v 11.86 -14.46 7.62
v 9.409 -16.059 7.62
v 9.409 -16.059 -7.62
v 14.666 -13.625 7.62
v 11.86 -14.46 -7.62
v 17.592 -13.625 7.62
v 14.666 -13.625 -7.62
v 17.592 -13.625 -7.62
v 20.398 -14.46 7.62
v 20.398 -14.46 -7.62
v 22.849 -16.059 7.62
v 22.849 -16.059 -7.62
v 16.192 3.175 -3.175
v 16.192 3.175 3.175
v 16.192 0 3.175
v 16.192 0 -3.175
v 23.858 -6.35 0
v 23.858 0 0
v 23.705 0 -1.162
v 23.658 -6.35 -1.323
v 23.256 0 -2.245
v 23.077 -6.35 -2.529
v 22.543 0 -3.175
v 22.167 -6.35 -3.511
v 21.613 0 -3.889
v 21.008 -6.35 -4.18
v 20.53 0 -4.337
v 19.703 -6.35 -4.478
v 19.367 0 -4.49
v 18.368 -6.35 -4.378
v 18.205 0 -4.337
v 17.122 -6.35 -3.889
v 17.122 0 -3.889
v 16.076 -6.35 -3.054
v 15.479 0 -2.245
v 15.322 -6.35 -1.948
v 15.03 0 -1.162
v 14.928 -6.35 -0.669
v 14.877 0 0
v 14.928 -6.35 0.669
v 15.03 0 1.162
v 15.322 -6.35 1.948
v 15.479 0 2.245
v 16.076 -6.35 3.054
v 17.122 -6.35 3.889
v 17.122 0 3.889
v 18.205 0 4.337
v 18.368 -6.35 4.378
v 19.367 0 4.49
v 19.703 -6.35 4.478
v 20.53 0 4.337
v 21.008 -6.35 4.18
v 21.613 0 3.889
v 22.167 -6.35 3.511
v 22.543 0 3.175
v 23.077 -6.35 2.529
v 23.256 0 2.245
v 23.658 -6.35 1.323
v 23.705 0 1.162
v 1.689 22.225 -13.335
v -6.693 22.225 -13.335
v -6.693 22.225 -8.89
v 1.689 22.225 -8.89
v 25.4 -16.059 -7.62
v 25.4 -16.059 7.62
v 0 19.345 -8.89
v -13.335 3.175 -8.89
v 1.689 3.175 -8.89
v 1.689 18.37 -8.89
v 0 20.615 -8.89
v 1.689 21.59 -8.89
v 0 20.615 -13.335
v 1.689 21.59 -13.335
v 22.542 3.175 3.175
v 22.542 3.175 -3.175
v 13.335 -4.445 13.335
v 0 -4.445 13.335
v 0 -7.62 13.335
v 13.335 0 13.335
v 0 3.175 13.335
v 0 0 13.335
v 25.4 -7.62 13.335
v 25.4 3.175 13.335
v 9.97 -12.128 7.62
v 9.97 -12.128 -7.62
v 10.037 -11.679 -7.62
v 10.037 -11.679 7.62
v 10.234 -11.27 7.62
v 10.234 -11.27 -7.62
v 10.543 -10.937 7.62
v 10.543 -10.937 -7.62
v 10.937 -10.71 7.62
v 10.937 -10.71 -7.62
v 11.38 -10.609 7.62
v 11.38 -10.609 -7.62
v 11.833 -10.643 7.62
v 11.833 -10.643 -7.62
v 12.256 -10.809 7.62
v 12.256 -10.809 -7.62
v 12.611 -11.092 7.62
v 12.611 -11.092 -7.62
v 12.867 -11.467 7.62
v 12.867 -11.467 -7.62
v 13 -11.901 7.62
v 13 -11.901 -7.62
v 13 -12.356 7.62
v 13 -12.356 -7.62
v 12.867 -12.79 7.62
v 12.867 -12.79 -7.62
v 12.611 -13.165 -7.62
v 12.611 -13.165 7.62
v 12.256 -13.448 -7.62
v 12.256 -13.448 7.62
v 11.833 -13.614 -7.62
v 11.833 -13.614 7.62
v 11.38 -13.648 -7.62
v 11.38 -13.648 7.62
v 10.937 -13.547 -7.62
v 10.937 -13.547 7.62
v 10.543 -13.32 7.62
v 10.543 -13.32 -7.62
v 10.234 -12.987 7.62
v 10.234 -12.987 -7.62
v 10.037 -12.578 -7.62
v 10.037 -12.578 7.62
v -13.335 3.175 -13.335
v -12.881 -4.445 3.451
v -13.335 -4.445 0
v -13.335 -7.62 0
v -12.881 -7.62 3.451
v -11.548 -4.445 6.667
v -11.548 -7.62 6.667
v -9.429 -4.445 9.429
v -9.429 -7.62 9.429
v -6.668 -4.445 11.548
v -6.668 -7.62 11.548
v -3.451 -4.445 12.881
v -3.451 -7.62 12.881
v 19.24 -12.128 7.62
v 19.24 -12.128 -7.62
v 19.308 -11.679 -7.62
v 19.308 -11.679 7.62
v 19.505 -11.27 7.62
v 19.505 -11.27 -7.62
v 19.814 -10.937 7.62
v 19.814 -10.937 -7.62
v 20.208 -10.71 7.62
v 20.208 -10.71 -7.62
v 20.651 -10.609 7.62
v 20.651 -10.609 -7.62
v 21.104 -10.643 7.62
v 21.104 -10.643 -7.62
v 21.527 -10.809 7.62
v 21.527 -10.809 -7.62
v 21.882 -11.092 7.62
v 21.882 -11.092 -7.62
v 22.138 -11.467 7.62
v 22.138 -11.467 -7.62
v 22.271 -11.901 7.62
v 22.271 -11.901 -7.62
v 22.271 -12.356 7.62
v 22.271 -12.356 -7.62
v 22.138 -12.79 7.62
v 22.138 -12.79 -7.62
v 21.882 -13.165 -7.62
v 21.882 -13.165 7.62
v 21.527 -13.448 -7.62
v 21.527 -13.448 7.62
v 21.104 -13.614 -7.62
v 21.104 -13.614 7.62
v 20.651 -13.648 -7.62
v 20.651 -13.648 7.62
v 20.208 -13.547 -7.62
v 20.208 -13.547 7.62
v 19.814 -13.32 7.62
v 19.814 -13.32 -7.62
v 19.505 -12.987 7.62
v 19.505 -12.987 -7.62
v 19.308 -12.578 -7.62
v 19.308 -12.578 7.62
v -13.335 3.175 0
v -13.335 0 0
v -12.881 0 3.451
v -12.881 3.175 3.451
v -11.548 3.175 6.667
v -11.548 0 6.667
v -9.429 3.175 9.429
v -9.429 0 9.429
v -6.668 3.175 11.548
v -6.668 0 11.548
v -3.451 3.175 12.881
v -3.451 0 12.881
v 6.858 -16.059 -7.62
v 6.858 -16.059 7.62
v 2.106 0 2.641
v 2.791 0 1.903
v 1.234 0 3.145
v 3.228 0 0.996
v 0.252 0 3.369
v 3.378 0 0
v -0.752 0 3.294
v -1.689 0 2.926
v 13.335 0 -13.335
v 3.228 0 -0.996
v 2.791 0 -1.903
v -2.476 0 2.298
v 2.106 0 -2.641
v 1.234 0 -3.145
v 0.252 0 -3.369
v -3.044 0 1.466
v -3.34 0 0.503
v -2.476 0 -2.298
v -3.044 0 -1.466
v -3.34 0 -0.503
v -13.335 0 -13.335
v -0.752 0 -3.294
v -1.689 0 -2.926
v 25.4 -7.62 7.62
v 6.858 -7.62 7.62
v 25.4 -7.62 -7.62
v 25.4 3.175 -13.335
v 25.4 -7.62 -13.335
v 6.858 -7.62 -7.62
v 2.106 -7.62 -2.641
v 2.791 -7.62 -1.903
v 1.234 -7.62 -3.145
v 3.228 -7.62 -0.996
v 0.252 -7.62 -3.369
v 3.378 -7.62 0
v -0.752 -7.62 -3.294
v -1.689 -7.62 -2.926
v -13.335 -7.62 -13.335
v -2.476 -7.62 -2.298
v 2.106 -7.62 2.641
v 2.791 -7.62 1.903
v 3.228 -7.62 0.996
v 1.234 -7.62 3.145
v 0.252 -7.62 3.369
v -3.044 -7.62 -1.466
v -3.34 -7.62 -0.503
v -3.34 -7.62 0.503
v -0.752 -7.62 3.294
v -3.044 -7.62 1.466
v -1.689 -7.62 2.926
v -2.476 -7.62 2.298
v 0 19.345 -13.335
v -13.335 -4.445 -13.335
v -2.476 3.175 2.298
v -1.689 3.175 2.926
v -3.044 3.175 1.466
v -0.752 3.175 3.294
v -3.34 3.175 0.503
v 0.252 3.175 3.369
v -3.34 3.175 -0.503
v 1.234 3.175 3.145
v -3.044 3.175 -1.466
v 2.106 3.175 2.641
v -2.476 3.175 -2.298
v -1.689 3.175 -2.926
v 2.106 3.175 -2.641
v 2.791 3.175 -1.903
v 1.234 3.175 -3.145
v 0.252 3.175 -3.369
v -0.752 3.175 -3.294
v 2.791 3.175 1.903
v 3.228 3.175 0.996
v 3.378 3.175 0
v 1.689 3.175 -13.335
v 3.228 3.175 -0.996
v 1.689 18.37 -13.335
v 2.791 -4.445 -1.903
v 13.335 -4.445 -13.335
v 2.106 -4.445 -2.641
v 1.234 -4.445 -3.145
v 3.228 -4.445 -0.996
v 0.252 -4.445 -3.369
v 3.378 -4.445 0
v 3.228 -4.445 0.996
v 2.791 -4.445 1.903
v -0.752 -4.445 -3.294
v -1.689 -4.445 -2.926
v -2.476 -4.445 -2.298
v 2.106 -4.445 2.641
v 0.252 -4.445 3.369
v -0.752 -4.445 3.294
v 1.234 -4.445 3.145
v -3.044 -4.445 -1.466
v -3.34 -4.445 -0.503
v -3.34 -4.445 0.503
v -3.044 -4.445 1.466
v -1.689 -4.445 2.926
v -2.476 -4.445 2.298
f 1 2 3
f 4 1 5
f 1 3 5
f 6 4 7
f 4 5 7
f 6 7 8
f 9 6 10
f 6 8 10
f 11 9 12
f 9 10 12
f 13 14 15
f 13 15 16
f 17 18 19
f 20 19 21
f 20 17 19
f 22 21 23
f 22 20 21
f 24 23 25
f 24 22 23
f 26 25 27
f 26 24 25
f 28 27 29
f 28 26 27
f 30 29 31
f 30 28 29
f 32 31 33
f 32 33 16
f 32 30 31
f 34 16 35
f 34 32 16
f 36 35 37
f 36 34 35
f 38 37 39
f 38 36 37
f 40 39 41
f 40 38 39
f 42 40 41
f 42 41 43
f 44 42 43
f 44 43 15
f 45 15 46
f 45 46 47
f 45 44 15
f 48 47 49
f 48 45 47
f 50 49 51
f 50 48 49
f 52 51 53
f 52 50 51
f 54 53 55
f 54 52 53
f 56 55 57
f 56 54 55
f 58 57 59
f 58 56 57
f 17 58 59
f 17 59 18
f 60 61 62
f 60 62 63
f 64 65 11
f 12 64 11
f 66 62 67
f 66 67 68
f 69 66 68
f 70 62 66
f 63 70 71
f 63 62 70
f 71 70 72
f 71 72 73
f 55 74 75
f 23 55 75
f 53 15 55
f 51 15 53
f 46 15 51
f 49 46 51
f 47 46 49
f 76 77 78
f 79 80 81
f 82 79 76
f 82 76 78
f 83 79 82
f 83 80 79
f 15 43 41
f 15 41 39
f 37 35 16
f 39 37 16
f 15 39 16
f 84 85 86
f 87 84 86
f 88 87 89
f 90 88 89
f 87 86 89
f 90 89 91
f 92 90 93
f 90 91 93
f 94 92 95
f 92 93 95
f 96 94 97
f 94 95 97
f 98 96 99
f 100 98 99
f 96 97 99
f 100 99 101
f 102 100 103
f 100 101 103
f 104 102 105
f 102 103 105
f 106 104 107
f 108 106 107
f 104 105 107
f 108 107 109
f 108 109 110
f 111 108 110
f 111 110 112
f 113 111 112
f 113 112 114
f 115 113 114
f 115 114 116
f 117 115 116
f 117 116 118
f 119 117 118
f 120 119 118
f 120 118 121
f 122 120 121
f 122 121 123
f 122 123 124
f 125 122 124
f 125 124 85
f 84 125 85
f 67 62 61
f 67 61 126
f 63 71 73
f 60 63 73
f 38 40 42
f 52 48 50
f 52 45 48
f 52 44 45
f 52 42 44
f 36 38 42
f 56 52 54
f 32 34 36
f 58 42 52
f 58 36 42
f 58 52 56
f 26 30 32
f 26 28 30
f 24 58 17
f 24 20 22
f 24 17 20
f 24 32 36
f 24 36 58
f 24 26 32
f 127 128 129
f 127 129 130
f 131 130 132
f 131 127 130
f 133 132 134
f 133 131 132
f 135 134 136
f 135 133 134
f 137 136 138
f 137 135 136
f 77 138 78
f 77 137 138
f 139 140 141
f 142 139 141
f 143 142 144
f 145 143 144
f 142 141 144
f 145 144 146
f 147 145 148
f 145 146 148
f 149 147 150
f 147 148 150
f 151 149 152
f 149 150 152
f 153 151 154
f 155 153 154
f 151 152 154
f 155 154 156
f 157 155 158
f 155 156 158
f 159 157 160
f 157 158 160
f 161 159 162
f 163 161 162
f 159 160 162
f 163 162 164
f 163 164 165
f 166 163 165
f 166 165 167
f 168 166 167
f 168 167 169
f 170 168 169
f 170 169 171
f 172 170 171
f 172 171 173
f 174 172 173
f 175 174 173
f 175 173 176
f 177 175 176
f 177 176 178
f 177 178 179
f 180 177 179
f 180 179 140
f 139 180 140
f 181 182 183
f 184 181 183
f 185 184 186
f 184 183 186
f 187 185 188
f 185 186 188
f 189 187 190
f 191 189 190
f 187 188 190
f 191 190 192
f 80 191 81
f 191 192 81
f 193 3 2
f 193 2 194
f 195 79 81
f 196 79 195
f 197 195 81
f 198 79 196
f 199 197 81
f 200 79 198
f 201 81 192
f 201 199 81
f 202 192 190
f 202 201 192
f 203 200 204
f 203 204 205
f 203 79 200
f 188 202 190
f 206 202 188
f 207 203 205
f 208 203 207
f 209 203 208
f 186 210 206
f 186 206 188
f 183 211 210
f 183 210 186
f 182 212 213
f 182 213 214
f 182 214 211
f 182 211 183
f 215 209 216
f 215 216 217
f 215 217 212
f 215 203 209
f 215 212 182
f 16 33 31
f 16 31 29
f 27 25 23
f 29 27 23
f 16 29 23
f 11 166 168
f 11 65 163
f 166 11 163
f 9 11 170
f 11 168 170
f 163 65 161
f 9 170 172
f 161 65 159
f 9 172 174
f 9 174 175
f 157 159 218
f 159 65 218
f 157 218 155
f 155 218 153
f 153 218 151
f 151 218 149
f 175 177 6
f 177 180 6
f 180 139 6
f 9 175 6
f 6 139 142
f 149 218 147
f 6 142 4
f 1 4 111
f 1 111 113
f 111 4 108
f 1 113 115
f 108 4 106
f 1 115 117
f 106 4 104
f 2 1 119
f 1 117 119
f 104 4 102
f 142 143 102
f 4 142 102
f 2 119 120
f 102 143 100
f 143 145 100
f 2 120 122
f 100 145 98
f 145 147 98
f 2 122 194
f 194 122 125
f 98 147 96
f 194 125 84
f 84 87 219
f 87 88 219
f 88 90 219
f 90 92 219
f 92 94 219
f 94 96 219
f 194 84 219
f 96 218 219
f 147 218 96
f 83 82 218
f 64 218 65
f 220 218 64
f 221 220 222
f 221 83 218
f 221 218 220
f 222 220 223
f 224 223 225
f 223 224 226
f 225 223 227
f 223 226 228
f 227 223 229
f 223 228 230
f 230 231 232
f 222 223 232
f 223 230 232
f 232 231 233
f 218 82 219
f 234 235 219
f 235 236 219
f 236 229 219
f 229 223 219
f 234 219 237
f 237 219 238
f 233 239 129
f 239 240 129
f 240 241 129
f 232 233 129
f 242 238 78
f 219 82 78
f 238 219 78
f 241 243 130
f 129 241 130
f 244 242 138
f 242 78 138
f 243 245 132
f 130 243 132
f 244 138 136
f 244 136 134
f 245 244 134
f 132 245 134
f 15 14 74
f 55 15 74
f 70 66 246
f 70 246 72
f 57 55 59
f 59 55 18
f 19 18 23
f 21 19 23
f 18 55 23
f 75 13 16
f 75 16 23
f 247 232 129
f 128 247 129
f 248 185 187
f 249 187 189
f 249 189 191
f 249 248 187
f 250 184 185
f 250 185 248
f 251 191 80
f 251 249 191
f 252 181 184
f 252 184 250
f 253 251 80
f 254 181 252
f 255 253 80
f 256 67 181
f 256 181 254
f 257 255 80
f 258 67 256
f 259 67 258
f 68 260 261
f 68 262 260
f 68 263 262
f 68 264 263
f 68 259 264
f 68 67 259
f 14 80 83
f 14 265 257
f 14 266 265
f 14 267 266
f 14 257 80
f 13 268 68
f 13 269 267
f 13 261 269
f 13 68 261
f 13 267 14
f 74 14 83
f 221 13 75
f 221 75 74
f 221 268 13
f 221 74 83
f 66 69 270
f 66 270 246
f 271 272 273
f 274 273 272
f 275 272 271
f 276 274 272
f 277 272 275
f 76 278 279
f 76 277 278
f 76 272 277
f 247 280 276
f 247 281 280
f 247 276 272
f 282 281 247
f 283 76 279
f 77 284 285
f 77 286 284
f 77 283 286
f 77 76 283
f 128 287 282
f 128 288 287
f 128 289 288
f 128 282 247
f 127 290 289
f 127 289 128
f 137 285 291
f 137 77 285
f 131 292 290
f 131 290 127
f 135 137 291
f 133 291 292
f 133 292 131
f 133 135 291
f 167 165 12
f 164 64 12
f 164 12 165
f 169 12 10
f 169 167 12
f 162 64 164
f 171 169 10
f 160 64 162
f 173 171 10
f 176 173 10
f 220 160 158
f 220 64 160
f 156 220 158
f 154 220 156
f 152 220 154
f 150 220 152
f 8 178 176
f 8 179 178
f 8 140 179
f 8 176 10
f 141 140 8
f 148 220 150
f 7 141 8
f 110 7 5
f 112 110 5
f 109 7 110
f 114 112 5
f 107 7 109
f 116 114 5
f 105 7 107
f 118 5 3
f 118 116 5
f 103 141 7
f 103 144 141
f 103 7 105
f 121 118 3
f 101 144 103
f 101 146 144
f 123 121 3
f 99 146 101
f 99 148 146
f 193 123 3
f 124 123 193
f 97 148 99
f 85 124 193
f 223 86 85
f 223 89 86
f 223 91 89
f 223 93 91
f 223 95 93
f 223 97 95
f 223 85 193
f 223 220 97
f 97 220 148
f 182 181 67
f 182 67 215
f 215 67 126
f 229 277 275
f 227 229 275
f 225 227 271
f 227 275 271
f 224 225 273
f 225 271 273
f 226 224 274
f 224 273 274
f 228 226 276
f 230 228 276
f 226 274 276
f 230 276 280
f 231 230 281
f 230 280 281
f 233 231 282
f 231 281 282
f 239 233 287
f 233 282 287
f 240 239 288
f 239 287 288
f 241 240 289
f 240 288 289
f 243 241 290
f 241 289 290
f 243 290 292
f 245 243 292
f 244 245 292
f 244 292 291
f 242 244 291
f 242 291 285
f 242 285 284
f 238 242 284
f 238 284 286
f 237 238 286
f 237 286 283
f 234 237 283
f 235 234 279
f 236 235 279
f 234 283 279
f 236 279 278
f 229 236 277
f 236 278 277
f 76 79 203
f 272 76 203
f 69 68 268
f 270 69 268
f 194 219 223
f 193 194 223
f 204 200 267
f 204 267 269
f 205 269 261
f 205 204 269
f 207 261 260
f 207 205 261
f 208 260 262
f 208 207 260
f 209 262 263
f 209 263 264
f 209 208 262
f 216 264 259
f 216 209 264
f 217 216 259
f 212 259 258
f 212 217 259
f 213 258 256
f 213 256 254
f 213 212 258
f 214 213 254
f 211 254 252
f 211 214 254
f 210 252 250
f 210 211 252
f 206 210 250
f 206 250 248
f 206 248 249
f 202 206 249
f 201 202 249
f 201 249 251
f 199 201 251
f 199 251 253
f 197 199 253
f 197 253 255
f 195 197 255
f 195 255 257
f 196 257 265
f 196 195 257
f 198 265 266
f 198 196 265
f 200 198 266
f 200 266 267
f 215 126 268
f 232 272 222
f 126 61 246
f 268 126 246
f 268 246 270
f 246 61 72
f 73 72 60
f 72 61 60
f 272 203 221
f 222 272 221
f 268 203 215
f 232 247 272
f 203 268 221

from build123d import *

# Parameters (mm, degrees)
SKETCH1_R            = 3.3782
BOSS_EXTRUDE1_DEPTH  = 3.175
BOSS_EXTRUDE2_DEPTH  = 4.445
SKETCH7_W            = 18.542
SKETCH7_H            = 15.24
BOSS_EXTRUDE4_DEPTH  = 8.43915
SKETCH8_R            = 1.524
CUT_EXTRUDE3_DEPTH   = 21.955
SKETCH9_R            = 10.16
CUT_EXTRUDE4_DEPTH   = 21.955
SKETCH22_W           = 6.35
SKETCH22_H           = 6.35
CUT_EXTRUDE6_DEPTH   = 9.525
SKETCH23_R           = 4.490128061
CUT_EXTRUDE7_DEPTH   = 6.35
BOSS_EXTRUDE10_DEPTH = 3.175
BOSS_EXTRUDE11_DEPTH = 3.175
SKETCH19_W           = 8.382
SKETCH19_H           = 4.445
BOSS_EXTRUDE12_DEPTH = 19.05
BOSS_EXTRUDE13_DEPTH = 4.445
CUT_EXTRUDE5_DEPTH   = 12.7


with BuildPart() as part:
    # Sketch1 → Boss-Extrude1 (new body)
    with BuildSketch(Plane(origin=(0, 0, 0), x_dir=(1, 0, 0), z_dir=(0, 1, 0))):
        with BuildLine():
            Line((0, -13.335), (25.4, -13.335))
            Line((25.4, -13.335), (25.4, 13.335))
            Line((25.4, 13.335), (0, 13.335))
            ThreePointArc((0, 13.335), (-13.335, 0), (0, -13.335))
        make_face()
        Circle(SKETCH1_R, mode=Mode.SUBTRACT)
    boss_extrude1 = extrude(amount=BOSS_EXTRUDE1_DEPTH)

    # Sketch2 → Boss-Extrude2 (add)
    with BuildSketch(Plane(origin=(0, 0, 0), x_dir=(-1, 0, 0), z_dir=(0, -1, 0))):
        Polygon((-25.4, 13.335), (-25.4, -13.335), (-13.335, -13.335), (-13.335, 0), (-13.335, 13.335), align=None)
    extrude(amount=BOSS_EXTRUDE2_DEPTH)

    # Mirror2: Boss-Extrude1 across plane
    add(boss_extrude1.mirror(Plane(origin=(0, -2.2225, 0), x_dir=(0, 0, 1), z_dir=(0, -1, 0))))

    # Sketch7 → Boss-Extrude4 (add)
    with BuildSketch(Plane(origin=(0, -7.62, 0), x_dir=(-1, 0, 0), z_dir=(0, -1, 0))):
        with Locations((-16.129, 0)):
            Rectangle(SKETCH7_W, SKETCH7_H)
    extrude(amount=BOSS_EXTRUDE4_DEPTH)

    # Sketch8 → Cut-Extrude3 (cut, through all)
    with BuildSketch(Plane(origin=(0, 0, -7.62), x_dir=(-1, 0, 0), z_dir=(0, 0, -1))):
        with Locations((-20.7645, -12.1285)):
            Circle(SKETCH8_R)
        with Locations((-11.4935, -12.1285)):
            Circle(SKETCH8_R)
    extrude(amount=-CUT_EXTRUDE3_DEPTH, mode=Mode.SUBTRACT)

    # Sketch9 → Cut-Extrude4 (cut, through all)
    with BuildSketch(Plane(origin=(0, 0, -7.62), x_dir=(-1, 0, 0), z_dir=(0, 0, -1))):
        with Locations((-16.129, -23.67915)):
            Circle(SKETCH9_R)
    extrude(amount=-CUT_EXTRUDE4_DEPTH, mode=Mode.SUBTRACT)

    # Sketch22 → Cut-Extrude6 (cut)
    with BuildSketch(Plane(origin=(0, 3.175, 0), x_dir=(1, 0, 0), z_dir=(0, 1, 0))):
        with Locations((19.3675, 0)):
            Rectangle(SKETCH22_W, SKETCH22_H)
    extrude(amount=-CUT_EXTRUDE6_DEPTH, mode=Mode.SUBTRACT)

    # Sketch23 → Cut-Extrude7 (cut)
    with BuildSketch(Plane(origin=(0, -6.35, 0), x_dir=(1, 0, 0), z_dir=(0, 1, 0))):
        with Locations((19.3675, 0)):
            Circle(SKETCH23_R)
    extrude(amount=CUT_EXTRUDE7_DEPTH, mode=Mode.SUBTRACT)

    # Sketch16 → Boss-Extrude10 (add)
    with BuildSketch(Plane(origin=(0, 3.175, 0), x_dir=(1, 0, 0), z_dir=(0, 1, 0))):
        Polygon((0, 13.335), (-13.335, 0), (-13.335, 13.335), align=None)
    extrude(amount=-BOSS_EXTRUDE10_DEPTH)

    # Sketch17 → Boss-Extrude11 (add)
    with BuildSketch(Plane.XZ.offset(7.62)):
        Polygon((-13.335, -13.335), (-13.335, 0), (0, -13.335), align=None)
    extrude(amount=-BOSS_EXTRUDE11_DEPTH)

    # Sketch19 → Boss-Extrude12 (add)
    with BuildSketch(Plane(origin=(0, 3.175, 0), x_dir=(1, 0, 0), z_dir=(0, 1, 0))):
        with Locations((-2.5019, 11.1125)):
            Rectangle(SKETCH19_W, SKETCH19_H)
    extrude(amount=BOSS_EXTRUDE12_DEPTH)

    # Sketch20 → Boss-Extrude13 (add)
    with BuildSketch(Plane.XY.offset(-8.89)):
        Polygon((-6.6929, 22.225), (-13.335, 3.175), (-6.6929, 3.175), align=None)
    extrude(amount=-BOSS_EXTRUDE13_DEPTH)

    # Sketch21 → Cut-Extrude5 (cut)
    with BuildSketch(Plane.XY.offset(-8.89)):
        Polygon((0, 20.61479766), (1.6891, 21.59), (1.6891, 18.369595321), (0, 19.34479766), align=None)
    extrude(amount=-CUT_EXTRUDE5_DEPTH, mode=Mode.SUBTRACT)


solid = part.part
